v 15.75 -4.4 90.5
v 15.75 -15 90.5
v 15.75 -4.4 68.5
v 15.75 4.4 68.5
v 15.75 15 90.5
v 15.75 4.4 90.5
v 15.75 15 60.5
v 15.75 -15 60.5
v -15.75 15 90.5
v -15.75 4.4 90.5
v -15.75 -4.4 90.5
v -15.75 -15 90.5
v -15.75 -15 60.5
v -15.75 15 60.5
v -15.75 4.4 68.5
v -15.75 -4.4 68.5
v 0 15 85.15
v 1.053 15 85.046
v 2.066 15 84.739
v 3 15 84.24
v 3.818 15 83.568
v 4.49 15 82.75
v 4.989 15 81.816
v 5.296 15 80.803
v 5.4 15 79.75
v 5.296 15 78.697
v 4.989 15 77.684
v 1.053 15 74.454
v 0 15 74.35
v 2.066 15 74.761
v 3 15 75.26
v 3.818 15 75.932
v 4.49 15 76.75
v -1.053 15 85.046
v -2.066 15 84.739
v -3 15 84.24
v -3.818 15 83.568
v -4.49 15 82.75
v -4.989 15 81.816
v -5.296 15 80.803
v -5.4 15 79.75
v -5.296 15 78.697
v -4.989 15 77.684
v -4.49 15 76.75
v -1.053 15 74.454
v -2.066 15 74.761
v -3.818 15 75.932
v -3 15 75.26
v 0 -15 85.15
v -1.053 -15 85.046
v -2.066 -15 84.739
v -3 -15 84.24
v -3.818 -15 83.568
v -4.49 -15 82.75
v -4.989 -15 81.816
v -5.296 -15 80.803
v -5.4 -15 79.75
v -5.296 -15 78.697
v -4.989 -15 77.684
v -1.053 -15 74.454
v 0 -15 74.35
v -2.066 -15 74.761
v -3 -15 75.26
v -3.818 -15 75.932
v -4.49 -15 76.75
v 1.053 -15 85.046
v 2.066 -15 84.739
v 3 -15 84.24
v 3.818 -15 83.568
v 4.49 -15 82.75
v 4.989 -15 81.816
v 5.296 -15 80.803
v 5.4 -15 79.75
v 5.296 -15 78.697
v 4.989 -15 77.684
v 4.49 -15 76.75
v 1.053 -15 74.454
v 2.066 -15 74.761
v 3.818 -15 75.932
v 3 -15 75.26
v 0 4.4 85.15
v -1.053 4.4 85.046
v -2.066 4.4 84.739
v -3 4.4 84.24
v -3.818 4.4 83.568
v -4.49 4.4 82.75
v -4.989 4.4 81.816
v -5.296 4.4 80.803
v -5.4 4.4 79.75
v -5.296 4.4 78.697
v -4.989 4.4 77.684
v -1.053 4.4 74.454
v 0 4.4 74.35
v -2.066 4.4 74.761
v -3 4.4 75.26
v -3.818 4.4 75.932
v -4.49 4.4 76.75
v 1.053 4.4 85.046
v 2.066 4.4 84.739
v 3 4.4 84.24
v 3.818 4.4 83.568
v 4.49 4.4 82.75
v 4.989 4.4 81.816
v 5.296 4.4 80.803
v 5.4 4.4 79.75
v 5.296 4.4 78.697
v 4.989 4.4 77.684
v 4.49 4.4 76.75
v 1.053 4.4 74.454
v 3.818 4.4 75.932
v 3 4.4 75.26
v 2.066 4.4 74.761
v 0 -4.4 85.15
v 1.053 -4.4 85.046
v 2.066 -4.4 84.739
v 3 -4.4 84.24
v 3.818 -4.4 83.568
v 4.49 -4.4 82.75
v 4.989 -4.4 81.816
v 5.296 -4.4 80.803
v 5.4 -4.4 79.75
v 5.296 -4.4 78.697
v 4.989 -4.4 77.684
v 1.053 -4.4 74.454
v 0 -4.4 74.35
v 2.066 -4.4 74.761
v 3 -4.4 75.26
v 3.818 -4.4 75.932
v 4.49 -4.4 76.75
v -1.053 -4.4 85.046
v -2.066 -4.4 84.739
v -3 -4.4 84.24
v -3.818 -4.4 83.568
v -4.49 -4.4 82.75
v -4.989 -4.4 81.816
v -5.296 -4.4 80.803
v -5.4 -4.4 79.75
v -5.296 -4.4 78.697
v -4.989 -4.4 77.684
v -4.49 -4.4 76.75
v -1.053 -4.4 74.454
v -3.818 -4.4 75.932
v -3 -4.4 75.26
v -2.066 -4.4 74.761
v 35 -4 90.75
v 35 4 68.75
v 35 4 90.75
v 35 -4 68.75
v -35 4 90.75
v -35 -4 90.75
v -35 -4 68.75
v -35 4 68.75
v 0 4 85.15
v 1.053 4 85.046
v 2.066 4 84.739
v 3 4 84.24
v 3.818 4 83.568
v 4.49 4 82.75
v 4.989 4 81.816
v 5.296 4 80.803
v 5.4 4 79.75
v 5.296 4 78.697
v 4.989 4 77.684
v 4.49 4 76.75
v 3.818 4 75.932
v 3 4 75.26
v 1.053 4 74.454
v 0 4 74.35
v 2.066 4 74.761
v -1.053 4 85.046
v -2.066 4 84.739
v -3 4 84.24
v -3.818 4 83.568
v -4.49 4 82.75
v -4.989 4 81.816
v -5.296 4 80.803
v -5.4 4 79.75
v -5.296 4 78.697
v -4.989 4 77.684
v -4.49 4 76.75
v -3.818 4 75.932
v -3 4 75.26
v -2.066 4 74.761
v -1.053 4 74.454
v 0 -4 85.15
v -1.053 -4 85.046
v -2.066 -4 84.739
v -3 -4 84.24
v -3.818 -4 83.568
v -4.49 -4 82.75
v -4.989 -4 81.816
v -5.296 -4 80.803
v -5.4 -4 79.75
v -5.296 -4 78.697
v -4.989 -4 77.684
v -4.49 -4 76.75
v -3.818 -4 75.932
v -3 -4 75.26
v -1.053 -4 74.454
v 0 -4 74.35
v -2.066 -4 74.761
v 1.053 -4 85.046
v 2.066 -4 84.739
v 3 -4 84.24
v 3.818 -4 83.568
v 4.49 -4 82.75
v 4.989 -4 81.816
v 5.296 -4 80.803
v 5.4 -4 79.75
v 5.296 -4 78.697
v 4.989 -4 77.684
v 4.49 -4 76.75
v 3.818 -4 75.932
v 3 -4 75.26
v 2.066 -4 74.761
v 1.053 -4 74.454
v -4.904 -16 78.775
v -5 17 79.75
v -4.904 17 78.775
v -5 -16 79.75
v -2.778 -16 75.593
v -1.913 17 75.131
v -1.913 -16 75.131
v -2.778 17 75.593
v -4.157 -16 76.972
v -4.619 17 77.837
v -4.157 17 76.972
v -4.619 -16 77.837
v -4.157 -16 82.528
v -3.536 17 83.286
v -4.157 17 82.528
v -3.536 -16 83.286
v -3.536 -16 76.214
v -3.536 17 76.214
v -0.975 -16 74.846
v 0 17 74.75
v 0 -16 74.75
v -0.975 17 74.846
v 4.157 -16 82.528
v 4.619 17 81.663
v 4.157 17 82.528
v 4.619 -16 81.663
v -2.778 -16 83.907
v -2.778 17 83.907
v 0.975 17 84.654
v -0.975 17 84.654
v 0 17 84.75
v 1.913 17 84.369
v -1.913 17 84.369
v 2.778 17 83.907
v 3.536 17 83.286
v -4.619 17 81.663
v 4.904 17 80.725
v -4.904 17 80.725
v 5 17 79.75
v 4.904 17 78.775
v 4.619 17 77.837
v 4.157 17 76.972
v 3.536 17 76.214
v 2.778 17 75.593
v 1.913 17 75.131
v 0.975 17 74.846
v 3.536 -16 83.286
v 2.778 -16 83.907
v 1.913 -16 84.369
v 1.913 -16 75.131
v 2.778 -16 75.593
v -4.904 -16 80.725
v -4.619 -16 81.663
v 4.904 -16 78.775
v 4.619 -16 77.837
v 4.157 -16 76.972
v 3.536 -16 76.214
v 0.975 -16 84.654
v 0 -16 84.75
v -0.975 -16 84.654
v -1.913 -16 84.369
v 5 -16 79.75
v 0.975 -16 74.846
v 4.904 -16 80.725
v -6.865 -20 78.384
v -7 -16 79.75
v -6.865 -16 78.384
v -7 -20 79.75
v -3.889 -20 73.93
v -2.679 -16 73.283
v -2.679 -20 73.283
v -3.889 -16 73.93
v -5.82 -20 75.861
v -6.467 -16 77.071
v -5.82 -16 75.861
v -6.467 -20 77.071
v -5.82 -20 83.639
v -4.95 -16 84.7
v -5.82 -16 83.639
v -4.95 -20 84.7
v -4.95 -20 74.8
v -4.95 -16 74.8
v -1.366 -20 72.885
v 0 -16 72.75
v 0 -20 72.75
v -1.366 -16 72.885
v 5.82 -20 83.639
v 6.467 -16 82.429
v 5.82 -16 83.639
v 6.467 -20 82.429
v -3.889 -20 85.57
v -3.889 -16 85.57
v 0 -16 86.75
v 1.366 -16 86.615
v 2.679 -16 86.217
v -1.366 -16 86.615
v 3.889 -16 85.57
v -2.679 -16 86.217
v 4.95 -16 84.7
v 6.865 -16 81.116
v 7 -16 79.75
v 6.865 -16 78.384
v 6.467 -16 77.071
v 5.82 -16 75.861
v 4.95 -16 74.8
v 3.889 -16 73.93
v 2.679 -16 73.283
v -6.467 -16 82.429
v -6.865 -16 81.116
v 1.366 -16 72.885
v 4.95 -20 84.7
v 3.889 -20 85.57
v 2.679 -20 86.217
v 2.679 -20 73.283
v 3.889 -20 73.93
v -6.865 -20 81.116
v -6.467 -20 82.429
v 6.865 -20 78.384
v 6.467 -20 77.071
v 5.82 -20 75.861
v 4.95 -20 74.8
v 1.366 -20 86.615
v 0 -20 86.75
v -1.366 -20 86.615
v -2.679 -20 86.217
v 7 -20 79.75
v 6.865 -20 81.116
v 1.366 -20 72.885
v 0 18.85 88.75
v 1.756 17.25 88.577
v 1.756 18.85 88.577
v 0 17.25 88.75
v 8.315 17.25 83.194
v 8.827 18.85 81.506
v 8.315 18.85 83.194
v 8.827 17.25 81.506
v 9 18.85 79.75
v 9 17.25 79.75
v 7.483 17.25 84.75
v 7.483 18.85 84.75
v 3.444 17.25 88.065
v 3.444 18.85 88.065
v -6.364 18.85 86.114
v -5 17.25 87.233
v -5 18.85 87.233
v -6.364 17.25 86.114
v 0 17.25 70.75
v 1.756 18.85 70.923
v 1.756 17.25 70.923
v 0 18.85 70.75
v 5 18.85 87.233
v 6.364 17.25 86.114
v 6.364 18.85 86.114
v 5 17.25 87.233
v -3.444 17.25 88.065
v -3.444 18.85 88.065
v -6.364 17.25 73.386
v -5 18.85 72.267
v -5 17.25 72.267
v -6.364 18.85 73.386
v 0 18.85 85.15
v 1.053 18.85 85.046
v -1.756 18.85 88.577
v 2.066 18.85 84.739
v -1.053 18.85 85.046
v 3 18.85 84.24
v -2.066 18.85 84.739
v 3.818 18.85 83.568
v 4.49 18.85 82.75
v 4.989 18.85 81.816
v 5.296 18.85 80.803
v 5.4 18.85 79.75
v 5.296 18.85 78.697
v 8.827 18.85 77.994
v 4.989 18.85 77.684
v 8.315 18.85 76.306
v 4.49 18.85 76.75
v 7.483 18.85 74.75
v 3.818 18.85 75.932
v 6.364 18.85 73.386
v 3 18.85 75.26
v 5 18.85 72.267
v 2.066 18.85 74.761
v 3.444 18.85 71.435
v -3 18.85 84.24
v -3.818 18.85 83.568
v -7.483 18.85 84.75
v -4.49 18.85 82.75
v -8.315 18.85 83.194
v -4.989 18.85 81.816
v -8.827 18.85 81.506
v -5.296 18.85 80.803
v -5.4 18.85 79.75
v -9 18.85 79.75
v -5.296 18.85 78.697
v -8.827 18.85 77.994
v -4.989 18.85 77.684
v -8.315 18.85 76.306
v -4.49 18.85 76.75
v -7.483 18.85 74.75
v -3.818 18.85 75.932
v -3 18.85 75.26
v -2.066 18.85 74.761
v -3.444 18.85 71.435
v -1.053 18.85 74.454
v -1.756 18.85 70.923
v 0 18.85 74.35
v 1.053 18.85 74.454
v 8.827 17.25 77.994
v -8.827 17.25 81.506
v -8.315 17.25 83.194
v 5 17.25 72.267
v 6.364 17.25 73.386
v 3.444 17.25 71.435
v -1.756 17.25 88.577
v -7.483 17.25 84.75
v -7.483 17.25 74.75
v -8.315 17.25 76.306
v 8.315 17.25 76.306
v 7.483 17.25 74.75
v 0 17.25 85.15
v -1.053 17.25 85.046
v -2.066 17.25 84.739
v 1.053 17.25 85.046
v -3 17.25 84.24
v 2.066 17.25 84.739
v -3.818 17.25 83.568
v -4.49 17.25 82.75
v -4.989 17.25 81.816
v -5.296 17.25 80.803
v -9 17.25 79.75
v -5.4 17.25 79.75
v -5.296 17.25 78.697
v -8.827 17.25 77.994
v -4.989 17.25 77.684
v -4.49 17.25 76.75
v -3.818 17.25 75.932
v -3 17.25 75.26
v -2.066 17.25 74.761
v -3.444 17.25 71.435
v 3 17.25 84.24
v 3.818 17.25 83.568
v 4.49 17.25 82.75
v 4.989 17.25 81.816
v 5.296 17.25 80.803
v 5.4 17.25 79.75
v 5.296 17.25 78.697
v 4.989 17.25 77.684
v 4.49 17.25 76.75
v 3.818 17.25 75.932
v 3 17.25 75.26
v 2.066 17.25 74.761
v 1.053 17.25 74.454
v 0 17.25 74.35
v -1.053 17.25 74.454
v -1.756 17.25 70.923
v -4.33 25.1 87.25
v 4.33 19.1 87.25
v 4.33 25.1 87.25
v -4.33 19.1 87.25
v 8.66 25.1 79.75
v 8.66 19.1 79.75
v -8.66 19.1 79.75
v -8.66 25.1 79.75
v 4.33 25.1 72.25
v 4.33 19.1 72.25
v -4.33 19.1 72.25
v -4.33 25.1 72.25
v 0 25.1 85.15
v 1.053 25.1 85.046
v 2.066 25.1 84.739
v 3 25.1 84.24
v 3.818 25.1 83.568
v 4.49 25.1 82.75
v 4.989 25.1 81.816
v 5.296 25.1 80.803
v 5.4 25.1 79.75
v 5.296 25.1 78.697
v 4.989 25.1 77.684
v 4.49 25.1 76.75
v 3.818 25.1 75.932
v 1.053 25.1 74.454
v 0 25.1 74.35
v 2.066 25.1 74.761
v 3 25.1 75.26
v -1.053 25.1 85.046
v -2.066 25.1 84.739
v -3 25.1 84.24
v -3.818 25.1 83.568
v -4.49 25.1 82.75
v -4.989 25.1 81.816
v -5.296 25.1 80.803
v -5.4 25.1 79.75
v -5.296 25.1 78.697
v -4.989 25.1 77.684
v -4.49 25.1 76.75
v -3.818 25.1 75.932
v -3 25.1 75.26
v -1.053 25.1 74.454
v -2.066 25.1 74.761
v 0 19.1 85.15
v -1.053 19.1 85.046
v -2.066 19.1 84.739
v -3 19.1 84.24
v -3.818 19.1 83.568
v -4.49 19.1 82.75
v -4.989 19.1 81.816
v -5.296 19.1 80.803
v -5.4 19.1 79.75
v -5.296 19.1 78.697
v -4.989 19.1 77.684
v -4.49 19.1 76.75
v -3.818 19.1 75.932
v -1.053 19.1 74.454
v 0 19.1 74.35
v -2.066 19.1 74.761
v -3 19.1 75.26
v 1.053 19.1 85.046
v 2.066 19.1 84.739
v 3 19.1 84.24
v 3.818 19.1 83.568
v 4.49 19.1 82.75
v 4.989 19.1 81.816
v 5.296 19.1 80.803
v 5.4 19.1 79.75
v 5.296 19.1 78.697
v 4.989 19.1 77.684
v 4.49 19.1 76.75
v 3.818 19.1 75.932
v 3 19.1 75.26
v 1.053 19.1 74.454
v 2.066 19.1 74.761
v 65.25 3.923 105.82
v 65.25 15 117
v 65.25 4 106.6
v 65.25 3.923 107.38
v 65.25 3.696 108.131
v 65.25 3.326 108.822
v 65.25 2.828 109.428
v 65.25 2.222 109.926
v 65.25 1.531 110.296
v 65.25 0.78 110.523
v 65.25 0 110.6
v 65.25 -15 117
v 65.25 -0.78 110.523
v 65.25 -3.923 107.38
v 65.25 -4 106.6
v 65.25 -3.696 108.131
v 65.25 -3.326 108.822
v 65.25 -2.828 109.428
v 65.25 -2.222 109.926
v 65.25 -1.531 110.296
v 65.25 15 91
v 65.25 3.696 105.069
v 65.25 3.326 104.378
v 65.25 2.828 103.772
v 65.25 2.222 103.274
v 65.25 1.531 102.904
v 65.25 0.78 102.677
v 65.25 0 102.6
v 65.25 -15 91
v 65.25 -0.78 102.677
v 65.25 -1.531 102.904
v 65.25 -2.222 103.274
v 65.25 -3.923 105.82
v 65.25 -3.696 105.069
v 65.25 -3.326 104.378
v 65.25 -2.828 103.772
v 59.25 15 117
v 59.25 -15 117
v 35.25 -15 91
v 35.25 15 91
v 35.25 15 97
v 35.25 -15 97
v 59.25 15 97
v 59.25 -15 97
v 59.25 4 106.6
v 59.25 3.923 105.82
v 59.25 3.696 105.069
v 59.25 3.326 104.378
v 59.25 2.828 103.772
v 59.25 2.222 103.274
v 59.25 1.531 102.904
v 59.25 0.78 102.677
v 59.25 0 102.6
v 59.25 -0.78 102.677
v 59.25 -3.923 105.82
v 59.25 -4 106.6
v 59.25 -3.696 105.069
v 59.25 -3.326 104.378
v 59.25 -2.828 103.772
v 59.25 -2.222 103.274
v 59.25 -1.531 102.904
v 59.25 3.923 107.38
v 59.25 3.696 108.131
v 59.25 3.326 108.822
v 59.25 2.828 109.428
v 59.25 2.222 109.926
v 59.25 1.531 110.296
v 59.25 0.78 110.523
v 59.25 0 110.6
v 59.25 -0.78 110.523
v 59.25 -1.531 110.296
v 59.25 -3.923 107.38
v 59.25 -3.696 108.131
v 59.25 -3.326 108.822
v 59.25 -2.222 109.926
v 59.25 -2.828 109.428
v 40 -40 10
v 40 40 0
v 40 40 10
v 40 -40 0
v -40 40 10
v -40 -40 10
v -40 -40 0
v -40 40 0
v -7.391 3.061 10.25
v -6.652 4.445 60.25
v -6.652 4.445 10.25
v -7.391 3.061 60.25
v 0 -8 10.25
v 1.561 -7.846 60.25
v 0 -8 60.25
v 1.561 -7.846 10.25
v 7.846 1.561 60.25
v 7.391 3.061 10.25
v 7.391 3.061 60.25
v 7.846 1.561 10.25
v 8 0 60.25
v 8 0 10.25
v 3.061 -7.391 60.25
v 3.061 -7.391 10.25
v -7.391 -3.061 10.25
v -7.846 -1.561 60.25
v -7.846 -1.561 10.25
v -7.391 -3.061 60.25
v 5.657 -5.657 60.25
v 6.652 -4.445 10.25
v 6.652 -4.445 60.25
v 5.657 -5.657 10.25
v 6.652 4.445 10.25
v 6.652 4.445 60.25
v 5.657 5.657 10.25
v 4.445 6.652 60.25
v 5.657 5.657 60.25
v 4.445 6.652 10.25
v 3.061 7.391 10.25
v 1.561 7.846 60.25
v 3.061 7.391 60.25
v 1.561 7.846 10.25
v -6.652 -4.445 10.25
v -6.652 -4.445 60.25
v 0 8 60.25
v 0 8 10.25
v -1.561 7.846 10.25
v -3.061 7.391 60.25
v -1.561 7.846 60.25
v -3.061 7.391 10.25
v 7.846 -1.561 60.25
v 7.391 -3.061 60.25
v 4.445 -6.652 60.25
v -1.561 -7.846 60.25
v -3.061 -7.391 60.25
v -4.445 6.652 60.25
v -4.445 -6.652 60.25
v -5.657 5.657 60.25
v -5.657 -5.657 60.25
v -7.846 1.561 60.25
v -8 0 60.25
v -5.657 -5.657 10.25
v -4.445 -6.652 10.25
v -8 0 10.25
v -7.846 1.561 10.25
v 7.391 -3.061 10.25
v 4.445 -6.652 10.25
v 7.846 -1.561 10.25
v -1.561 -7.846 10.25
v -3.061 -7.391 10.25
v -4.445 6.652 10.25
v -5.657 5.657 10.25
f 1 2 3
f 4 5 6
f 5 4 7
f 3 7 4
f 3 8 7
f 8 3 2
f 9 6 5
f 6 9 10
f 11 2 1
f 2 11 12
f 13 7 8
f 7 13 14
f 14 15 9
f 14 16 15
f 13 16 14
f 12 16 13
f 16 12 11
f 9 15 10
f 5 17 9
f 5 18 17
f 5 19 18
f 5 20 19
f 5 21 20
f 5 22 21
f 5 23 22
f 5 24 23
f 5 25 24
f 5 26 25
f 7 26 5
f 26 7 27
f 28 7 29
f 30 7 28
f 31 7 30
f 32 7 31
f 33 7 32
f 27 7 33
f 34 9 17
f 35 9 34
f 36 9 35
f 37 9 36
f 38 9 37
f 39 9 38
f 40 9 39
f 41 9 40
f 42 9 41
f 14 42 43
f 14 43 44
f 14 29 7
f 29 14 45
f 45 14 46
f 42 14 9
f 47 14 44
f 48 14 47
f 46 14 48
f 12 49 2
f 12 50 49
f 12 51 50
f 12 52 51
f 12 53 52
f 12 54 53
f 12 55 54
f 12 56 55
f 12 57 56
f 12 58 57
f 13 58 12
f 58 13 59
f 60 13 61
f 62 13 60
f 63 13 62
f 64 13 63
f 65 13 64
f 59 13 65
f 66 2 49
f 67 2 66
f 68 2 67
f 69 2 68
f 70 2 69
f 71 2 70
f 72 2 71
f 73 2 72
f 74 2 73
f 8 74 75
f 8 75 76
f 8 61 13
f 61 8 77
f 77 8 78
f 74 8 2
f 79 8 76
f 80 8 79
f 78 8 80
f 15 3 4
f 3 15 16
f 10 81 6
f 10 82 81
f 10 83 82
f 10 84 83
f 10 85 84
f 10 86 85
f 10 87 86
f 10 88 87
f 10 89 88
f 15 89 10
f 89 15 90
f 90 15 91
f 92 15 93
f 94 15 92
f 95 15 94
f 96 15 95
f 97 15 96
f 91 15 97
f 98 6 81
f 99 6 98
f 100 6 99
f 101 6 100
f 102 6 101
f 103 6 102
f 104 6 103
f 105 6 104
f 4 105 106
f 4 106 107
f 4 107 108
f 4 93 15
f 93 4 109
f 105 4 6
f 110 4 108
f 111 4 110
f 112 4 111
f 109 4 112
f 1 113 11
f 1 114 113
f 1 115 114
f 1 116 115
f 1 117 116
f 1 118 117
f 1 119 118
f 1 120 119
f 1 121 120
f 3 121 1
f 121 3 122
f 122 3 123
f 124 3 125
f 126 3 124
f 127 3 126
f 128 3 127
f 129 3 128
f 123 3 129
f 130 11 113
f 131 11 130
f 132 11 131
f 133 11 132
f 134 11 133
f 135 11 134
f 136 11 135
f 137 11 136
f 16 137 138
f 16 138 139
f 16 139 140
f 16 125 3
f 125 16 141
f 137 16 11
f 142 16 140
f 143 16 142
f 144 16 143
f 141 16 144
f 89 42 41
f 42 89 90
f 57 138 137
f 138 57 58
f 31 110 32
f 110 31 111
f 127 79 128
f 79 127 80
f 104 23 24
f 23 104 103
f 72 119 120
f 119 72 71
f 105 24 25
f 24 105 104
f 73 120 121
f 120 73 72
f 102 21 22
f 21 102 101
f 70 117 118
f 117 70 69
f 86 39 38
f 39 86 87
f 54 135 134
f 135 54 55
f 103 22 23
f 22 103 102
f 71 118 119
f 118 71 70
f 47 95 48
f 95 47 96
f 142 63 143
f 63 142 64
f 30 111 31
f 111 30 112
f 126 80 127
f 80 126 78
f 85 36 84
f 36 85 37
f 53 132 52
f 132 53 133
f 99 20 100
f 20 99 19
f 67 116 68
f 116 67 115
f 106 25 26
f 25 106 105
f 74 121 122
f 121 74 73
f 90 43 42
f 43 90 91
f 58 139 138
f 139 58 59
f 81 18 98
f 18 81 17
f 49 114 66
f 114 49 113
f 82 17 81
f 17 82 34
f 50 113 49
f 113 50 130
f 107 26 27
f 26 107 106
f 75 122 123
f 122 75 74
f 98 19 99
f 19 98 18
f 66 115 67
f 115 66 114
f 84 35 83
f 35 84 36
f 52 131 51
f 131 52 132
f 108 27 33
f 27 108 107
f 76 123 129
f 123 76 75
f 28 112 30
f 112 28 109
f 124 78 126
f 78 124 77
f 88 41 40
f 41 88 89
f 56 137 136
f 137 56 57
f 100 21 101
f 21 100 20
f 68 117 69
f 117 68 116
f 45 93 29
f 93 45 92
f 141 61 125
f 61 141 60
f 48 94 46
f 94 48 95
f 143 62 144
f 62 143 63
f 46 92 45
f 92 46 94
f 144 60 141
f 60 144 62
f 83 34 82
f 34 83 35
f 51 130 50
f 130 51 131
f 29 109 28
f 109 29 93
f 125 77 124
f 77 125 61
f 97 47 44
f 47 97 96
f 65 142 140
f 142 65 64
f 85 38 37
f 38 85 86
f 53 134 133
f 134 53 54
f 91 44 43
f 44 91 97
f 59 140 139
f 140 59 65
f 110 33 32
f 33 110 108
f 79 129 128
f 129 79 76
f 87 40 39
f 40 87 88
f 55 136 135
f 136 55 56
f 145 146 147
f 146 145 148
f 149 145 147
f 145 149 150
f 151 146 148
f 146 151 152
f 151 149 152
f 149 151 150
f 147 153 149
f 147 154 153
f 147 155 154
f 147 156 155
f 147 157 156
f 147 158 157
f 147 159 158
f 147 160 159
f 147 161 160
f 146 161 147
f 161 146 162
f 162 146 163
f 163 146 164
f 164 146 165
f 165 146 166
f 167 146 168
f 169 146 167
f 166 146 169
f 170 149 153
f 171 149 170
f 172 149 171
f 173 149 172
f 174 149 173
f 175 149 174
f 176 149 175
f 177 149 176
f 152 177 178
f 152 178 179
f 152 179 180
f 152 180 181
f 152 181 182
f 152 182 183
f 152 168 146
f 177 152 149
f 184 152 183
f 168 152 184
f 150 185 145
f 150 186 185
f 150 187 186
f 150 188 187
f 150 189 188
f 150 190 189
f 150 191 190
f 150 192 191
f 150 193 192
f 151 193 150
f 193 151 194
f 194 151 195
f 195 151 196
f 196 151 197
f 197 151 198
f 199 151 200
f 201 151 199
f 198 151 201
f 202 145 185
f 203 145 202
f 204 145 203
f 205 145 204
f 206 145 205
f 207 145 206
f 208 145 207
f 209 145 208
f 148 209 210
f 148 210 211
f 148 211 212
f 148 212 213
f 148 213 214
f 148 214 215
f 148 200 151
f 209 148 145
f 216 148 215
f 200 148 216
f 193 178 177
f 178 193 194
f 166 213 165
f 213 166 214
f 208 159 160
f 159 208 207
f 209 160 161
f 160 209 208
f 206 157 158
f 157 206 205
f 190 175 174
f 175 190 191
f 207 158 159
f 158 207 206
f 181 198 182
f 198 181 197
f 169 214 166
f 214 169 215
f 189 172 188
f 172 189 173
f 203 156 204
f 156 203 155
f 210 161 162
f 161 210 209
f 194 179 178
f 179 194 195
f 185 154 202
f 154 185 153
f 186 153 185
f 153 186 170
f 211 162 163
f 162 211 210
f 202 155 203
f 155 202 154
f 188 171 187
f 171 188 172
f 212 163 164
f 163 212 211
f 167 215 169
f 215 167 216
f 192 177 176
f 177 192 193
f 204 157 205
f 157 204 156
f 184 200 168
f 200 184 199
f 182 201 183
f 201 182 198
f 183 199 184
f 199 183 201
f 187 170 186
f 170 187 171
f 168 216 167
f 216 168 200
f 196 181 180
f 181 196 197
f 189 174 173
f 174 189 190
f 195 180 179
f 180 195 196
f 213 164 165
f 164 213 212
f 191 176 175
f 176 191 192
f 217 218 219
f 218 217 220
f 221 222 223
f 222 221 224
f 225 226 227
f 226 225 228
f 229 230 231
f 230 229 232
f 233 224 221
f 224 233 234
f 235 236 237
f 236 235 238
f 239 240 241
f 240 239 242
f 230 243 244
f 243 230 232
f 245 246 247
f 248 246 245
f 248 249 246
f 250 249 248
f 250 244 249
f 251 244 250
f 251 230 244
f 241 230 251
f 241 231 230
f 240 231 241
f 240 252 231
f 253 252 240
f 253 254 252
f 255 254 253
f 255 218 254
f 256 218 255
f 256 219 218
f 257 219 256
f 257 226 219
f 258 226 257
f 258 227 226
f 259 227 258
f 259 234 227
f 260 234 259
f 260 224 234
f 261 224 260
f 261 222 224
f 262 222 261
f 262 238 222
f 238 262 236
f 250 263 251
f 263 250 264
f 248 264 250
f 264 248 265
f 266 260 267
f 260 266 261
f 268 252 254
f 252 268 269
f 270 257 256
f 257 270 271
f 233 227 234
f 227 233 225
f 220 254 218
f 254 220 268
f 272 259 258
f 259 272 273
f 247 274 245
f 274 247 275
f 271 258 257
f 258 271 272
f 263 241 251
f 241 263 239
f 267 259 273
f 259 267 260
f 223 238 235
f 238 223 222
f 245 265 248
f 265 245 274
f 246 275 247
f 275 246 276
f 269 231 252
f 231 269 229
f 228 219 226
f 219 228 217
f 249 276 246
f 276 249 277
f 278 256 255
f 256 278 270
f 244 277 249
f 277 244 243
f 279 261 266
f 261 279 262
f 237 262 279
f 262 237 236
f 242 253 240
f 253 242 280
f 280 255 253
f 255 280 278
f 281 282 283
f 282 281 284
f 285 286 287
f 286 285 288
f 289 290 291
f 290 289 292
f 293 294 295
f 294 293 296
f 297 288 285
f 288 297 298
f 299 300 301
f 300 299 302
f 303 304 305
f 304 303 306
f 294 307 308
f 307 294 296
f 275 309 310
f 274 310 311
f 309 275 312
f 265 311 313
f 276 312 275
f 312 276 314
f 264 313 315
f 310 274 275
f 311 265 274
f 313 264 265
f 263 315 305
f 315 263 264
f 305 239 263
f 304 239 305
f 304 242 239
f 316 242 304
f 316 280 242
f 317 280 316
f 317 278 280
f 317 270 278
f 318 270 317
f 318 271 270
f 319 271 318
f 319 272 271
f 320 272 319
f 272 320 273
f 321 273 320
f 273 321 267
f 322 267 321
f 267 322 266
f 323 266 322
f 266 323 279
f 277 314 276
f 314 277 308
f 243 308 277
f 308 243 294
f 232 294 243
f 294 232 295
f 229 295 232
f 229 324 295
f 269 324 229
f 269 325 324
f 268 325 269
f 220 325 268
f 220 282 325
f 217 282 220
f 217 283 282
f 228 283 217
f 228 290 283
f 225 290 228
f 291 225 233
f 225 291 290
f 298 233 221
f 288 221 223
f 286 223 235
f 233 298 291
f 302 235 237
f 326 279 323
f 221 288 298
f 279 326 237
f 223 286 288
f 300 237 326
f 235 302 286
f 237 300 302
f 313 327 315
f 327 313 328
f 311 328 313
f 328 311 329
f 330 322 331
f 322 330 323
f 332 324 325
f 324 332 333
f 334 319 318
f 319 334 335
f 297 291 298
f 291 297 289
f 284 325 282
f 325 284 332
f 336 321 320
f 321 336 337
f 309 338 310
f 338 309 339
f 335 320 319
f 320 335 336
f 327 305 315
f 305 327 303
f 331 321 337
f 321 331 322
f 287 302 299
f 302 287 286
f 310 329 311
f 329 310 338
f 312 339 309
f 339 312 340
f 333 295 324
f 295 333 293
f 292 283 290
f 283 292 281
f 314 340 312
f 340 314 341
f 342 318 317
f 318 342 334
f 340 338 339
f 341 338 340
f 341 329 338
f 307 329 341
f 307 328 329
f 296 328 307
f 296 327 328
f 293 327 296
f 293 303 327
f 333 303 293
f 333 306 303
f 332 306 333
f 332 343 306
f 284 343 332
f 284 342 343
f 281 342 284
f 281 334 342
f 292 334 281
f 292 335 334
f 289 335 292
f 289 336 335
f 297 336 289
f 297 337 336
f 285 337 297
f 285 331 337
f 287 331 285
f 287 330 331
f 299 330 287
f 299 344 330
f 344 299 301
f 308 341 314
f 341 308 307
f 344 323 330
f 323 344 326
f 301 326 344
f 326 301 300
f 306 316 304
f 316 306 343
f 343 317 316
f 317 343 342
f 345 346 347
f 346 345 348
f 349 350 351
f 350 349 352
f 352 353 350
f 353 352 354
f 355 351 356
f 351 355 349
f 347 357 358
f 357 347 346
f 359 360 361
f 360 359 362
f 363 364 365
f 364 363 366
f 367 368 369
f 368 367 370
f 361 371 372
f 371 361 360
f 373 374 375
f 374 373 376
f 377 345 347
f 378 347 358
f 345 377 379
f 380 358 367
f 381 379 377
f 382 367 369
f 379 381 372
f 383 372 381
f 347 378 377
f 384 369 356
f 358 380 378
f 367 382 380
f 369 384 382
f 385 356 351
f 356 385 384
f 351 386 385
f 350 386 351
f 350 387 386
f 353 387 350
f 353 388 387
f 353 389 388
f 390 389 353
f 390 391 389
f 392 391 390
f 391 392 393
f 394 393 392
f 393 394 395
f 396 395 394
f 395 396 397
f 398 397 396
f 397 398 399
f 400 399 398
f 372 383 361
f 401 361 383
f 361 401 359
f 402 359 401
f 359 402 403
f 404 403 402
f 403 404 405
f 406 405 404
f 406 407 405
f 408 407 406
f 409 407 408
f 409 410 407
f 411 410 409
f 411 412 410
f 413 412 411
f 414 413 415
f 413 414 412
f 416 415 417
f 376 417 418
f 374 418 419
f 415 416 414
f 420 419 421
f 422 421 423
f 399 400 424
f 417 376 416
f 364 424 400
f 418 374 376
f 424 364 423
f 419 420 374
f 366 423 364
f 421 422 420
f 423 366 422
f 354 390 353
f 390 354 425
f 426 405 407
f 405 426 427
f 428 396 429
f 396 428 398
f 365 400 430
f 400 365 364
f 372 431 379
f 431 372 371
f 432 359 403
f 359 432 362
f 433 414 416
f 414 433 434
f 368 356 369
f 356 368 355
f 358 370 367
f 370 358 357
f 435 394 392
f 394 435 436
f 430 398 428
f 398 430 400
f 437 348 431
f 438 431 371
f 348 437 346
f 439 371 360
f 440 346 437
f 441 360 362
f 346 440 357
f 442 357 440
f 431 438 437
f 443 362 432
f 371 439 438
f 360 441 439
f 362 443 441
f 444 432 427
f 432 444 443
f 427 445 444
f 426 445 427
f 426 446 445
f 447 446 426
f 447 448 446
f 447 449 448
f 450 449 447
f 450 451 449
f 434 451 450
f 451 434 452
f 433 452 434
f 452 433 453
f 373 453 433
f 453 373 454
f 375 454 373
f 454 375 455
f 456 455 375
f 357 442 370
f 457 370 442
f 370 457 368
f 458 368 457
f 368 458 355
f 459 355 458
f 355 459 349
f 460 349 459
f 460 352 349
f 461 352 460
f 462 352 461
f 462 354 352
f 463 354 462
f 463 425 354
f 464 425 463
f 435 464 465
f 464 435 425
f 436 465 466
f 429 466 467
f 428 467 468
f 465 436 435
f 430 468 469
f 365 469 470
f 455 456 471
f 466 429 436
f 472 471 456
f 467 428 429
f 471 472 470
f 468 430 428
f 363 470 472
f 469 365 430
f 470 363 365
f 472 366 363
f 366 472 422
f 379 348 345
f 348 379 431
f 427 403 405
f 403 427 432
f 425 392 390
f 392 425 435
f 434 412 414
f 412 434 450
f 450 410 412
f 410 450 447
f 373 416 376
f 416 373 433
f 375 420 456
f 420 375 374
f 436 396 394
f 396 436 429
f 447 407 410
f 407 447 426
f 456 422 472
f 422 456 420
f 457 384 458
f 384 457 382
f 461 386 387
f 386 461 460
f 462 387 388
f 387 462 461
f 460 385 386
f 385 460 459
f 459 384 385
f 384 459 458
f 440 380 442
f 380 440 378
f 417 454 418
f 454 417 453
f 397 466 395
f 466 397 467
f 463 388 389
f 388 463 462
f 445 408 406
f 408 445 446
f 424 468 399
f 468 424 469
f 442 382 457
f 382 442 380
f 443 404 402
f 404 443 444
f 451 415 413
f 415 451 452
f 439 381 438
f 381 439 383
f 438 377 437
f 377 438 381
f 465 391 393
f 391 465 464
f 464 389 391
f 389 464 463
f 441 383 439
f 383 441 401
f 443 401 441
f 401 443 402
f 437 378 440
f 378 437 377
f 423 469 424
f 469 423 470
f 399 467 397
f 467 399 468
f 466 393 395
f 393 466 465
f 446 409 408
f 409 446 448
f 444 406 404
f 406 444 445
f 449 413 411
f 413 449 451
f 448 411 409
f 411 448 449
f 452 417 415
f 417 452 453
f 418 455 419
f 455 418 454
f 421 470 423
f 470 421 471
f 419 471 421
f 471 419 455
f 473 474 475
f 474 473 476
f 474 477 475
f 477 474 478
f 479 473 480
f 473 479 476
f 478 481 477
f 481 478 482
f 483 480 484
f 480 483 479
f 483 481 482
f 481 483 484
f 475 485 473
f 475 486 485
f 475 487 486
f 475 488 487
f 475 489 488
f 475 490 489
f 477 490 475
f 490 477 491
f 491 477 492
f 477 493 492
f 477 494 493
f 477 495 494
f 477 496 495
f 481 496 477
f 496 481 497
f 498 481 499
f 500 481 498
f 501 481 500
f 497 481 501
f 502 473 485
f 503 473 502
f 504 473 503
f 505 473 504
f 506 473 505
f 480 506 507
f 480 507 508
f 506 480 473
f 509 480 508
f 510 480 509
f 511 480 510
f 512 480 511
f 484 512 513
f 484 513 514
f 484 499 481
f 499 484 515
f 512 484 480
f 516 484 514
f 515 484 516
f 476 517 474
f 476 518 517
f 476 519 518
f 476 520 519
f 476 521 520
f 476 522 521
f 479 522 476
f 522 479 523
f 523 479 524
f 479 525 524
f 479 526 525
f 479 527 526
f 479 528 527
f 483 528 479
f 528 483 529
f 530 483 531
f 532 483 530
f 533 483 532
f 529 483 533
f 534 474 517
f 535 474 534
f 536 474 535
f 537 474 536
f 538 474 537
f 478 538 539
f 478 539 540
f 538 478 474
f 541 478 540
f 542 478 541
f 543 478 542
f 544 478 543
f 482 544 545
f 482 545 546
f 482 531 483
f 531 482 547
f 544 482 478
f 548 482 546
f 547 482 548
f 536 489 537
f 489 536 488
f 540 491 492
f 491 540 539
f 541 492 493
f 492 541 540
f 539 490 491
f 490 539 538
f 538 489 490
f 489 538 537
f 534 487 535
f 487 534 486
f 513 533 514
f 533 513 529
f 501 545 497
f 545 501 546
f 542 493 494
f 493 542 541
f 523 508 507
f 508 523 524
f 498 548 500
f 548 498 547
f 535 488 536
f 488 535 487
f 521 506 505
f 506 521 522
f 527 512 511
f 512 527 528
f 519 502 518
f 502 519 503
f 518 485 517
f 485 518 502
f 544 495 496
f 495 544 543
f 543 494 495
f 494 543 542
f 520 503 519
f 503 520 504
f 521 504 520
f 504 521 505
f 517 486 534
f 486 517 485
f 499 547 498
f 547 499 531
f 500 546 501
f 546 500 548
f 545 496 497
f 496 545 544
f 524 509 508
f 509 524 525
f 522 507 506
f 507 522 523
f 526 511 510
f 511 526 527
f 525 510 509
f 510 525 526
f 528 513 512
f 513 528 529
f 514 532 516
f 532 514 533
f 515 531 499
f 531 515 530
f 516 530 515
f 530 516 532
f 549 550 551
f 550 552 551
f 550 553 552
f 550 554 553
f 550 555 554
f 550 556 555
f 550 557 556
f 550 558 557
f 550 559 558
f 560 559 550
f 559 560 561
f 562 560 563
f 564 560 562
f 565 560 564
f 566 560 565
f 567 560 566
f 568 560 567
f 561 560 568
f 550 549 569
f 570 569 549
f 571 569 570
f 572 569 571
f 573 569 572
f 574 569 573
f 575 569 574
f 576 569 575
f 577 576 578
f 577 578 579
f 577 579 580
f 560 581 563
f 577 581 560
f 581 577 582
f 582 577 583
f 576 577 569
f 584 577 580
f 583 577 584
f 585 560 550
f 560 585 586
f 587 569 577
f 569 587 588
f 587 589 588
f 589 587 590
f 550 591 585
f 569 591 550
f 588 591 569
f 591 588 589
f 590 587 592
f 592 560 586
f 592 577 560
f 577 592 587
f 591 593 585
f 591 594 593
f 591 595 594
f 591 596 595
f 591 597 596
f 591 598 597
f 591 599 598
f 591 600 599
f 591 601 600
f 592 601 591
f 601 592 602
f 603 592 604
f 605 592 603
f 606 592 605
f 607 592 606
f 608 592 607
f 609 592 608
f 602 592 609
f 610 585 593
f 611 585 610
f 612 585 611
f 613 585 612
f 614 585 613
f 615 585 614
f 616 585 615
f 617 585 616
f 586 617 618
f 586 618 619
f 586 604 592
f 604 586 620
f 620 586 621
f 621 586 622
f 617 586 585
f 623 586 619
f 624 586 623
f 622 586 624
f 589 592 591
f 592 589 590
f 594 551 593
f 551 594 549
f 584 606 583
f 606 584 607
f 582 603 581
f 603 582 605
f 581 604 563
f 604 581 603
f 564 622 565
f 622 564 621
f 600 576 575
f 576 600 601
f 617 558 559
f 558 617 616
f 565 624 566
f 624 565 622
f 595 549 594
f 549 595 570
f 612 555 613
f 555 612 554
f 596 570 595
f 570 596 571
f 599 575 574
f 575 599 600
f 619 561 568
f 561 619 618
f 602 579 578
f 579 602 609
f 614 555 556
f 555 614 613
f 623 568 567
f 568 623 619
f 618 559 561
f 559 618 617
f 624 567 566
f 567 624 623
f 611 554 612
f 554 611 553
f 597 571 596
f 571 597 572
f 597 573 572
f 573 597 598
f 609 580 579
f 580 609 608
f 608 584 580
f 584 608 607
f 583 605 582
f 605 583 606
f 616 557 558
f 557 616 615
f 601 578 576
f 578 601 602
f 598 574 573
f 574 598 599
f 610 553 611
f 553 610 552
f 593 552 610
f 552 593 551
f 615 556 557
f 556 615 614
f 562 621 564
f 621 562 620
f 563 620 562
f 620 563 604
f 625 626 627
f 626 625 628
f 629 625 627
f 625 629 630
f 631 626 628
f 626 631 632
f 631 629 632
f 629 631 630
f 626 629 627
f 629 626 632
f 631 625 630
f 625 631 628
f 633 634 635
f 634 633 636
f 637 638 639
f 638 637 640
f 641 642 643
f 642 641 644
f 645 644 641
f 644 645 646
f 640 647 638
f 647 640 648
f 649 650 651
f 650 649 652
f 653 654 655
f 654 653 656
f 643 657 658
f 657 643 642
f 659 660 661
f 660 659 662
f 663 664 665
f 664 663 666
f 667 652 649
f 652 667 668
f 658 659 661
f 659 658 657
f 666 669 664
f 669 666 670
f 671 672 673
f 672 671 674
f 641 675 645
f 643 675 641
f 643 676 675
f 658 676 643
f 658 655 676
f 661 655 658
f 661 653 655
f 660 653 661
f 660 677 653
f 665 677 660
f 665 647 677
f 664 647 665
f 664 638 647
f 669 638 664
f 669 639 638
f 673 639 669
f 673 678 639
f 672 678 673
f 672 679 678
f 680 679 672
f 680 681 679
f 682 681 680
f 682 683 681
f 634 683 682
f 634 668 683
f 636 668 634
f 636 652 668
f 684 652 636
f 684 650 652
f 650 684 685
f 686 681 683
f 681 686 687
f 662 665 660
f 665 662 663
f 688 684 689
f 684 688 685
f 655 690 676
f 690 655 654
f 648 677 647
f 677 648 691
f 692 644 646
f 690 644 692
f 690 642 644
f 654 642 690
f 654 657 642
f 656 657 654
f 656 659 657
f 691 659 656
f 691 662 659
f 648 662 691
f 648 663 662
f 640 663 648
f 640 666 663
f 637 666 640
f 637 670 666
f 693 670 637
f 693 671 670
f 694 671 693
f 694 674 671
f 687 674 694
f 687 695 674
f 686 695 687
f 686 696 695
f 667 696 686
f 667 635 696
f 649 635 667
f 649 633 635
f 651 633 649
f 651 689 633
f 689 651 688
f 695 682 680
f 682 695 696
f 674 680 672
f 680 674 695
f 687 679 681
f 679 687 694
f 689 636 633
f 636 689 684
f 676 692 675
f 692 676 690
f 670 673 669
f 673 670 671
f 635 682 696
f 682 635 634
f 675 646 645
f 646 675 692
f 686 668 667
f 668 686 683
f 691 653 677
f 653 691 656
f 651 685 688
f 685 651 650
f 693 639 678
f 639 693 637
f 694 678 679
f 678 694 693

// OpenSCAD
$fn = 32;

// ------------------------------------------------------------------------
// Lamp arm: column d16 x 50 mm, arm 70 mm
// Every part is its own module, assembly() places every instance.
// ------------------------------------------------------------------------

// --- part 1 ---
module lamp_base() {
  difference() {
    translate([-40, -40, 0]) cube([80, 80, 10]);
  }
}

// --- part 2 ---
module lamp_column() {
  cylinder(h = 50, d = 16);
}

// --- part 3 ---
module head_fork() {
  difference() {
    translate([-15.75, -15, 0]) cube([31.5, 30, 30]);
    translate([-16.75, -4.4, 8]) cube([33.5, 8.8, 23]);
    translate([0, 0, 19.25]) rotate([90, 0, 0]) cylinder(h = 32, d = 10.8, center = true);
  }
}

// --- part 4 ---
module lamp_arm() {
  difference() {
    translate([-35, -4, 0]) cube([70, 8, 22]);
    translate([0, 0, 11]) rotate([90, 0, 0]) cylinder(h = 10, d = 10.8, center = true);
  }
}

// --- part 5 ---
module arm_pin() {
  rotate([0, 90, 0]) cylinder(h = 34, d = 10, center = true);
  translate([-20, 0, 0]) rotate([0, 90, 0]) cylinder(h = 4, d = 14);
}

// --- part 6 ---
module arm_washer() {
  difference() {
      translate([0, 0, 0]) cylinder(h = 1.6, d = 18);
      translate([0, 0, -1]) cylinder(h = 3.6, d = 10.8);
    }
}

// --- part 7 ---
module arm_nut() {
  difference() {
    linear_extrude(height = 6) polygon(points = [[8.66, 0], [4.33, 7.5], [-4.33, 7.5], [-8.66, 0], [-4.33, -7.5], [4.33, -7.5]]);
    translate([0, 0, -1]) cylinder(h = 8, d = 10.8);
  }
}

// --- part 8 ---
module shade_bracket() {
  difference() {
    translate([-15, -15, 0]) cube([30, 30, 26]);
    translate([-16, -16, 6]) cube([25, 32, 21]);
    translate([12, 0, 15.6]) rotate([0, 90, 0]) cylinder(h = 8, d = 8, center = true);
  }
}

// --- assembly ---
module assembly() {
  color([0.80, 0.24, 0.20]) translate([0, 0, 0]) rotate([0, 0, 0]) lamp_base();
  color([0.20, 0.45, 0.75]) translate([0, 0, 10.25]) rotate([0, 0, 0]) lamp_column();
  color([0.25, 0.62, 0.32]) translate([0, 0, 60.5]) rotate([0, 0, 0]) head_fork();
  color([0.92, 0.70, 0.18]) translate([0, 0, 68.75]) rotate([0, 0, 0]) lamp_arm();
  color([0.58, 0.35, 0.70]) translate([0, 0, 79.75]) rotate([0, 0, 90]) arm_pin();
  color([0.16, 0.66, 0.66]) translate([0, 18.85, 79.75]) rotate([90, 0, 0]) arm_washer();
  color([0.85, 0.48, 0.18]) translate([0, 25.1, 79.75]) rotate([90, 0, 0]) arm_nut();
  color([0.55, 0.60, 0.65]) translate([50.25, 0, 91]) rotate([0, 0, 0]) shade_bracket();
}

assembly();
